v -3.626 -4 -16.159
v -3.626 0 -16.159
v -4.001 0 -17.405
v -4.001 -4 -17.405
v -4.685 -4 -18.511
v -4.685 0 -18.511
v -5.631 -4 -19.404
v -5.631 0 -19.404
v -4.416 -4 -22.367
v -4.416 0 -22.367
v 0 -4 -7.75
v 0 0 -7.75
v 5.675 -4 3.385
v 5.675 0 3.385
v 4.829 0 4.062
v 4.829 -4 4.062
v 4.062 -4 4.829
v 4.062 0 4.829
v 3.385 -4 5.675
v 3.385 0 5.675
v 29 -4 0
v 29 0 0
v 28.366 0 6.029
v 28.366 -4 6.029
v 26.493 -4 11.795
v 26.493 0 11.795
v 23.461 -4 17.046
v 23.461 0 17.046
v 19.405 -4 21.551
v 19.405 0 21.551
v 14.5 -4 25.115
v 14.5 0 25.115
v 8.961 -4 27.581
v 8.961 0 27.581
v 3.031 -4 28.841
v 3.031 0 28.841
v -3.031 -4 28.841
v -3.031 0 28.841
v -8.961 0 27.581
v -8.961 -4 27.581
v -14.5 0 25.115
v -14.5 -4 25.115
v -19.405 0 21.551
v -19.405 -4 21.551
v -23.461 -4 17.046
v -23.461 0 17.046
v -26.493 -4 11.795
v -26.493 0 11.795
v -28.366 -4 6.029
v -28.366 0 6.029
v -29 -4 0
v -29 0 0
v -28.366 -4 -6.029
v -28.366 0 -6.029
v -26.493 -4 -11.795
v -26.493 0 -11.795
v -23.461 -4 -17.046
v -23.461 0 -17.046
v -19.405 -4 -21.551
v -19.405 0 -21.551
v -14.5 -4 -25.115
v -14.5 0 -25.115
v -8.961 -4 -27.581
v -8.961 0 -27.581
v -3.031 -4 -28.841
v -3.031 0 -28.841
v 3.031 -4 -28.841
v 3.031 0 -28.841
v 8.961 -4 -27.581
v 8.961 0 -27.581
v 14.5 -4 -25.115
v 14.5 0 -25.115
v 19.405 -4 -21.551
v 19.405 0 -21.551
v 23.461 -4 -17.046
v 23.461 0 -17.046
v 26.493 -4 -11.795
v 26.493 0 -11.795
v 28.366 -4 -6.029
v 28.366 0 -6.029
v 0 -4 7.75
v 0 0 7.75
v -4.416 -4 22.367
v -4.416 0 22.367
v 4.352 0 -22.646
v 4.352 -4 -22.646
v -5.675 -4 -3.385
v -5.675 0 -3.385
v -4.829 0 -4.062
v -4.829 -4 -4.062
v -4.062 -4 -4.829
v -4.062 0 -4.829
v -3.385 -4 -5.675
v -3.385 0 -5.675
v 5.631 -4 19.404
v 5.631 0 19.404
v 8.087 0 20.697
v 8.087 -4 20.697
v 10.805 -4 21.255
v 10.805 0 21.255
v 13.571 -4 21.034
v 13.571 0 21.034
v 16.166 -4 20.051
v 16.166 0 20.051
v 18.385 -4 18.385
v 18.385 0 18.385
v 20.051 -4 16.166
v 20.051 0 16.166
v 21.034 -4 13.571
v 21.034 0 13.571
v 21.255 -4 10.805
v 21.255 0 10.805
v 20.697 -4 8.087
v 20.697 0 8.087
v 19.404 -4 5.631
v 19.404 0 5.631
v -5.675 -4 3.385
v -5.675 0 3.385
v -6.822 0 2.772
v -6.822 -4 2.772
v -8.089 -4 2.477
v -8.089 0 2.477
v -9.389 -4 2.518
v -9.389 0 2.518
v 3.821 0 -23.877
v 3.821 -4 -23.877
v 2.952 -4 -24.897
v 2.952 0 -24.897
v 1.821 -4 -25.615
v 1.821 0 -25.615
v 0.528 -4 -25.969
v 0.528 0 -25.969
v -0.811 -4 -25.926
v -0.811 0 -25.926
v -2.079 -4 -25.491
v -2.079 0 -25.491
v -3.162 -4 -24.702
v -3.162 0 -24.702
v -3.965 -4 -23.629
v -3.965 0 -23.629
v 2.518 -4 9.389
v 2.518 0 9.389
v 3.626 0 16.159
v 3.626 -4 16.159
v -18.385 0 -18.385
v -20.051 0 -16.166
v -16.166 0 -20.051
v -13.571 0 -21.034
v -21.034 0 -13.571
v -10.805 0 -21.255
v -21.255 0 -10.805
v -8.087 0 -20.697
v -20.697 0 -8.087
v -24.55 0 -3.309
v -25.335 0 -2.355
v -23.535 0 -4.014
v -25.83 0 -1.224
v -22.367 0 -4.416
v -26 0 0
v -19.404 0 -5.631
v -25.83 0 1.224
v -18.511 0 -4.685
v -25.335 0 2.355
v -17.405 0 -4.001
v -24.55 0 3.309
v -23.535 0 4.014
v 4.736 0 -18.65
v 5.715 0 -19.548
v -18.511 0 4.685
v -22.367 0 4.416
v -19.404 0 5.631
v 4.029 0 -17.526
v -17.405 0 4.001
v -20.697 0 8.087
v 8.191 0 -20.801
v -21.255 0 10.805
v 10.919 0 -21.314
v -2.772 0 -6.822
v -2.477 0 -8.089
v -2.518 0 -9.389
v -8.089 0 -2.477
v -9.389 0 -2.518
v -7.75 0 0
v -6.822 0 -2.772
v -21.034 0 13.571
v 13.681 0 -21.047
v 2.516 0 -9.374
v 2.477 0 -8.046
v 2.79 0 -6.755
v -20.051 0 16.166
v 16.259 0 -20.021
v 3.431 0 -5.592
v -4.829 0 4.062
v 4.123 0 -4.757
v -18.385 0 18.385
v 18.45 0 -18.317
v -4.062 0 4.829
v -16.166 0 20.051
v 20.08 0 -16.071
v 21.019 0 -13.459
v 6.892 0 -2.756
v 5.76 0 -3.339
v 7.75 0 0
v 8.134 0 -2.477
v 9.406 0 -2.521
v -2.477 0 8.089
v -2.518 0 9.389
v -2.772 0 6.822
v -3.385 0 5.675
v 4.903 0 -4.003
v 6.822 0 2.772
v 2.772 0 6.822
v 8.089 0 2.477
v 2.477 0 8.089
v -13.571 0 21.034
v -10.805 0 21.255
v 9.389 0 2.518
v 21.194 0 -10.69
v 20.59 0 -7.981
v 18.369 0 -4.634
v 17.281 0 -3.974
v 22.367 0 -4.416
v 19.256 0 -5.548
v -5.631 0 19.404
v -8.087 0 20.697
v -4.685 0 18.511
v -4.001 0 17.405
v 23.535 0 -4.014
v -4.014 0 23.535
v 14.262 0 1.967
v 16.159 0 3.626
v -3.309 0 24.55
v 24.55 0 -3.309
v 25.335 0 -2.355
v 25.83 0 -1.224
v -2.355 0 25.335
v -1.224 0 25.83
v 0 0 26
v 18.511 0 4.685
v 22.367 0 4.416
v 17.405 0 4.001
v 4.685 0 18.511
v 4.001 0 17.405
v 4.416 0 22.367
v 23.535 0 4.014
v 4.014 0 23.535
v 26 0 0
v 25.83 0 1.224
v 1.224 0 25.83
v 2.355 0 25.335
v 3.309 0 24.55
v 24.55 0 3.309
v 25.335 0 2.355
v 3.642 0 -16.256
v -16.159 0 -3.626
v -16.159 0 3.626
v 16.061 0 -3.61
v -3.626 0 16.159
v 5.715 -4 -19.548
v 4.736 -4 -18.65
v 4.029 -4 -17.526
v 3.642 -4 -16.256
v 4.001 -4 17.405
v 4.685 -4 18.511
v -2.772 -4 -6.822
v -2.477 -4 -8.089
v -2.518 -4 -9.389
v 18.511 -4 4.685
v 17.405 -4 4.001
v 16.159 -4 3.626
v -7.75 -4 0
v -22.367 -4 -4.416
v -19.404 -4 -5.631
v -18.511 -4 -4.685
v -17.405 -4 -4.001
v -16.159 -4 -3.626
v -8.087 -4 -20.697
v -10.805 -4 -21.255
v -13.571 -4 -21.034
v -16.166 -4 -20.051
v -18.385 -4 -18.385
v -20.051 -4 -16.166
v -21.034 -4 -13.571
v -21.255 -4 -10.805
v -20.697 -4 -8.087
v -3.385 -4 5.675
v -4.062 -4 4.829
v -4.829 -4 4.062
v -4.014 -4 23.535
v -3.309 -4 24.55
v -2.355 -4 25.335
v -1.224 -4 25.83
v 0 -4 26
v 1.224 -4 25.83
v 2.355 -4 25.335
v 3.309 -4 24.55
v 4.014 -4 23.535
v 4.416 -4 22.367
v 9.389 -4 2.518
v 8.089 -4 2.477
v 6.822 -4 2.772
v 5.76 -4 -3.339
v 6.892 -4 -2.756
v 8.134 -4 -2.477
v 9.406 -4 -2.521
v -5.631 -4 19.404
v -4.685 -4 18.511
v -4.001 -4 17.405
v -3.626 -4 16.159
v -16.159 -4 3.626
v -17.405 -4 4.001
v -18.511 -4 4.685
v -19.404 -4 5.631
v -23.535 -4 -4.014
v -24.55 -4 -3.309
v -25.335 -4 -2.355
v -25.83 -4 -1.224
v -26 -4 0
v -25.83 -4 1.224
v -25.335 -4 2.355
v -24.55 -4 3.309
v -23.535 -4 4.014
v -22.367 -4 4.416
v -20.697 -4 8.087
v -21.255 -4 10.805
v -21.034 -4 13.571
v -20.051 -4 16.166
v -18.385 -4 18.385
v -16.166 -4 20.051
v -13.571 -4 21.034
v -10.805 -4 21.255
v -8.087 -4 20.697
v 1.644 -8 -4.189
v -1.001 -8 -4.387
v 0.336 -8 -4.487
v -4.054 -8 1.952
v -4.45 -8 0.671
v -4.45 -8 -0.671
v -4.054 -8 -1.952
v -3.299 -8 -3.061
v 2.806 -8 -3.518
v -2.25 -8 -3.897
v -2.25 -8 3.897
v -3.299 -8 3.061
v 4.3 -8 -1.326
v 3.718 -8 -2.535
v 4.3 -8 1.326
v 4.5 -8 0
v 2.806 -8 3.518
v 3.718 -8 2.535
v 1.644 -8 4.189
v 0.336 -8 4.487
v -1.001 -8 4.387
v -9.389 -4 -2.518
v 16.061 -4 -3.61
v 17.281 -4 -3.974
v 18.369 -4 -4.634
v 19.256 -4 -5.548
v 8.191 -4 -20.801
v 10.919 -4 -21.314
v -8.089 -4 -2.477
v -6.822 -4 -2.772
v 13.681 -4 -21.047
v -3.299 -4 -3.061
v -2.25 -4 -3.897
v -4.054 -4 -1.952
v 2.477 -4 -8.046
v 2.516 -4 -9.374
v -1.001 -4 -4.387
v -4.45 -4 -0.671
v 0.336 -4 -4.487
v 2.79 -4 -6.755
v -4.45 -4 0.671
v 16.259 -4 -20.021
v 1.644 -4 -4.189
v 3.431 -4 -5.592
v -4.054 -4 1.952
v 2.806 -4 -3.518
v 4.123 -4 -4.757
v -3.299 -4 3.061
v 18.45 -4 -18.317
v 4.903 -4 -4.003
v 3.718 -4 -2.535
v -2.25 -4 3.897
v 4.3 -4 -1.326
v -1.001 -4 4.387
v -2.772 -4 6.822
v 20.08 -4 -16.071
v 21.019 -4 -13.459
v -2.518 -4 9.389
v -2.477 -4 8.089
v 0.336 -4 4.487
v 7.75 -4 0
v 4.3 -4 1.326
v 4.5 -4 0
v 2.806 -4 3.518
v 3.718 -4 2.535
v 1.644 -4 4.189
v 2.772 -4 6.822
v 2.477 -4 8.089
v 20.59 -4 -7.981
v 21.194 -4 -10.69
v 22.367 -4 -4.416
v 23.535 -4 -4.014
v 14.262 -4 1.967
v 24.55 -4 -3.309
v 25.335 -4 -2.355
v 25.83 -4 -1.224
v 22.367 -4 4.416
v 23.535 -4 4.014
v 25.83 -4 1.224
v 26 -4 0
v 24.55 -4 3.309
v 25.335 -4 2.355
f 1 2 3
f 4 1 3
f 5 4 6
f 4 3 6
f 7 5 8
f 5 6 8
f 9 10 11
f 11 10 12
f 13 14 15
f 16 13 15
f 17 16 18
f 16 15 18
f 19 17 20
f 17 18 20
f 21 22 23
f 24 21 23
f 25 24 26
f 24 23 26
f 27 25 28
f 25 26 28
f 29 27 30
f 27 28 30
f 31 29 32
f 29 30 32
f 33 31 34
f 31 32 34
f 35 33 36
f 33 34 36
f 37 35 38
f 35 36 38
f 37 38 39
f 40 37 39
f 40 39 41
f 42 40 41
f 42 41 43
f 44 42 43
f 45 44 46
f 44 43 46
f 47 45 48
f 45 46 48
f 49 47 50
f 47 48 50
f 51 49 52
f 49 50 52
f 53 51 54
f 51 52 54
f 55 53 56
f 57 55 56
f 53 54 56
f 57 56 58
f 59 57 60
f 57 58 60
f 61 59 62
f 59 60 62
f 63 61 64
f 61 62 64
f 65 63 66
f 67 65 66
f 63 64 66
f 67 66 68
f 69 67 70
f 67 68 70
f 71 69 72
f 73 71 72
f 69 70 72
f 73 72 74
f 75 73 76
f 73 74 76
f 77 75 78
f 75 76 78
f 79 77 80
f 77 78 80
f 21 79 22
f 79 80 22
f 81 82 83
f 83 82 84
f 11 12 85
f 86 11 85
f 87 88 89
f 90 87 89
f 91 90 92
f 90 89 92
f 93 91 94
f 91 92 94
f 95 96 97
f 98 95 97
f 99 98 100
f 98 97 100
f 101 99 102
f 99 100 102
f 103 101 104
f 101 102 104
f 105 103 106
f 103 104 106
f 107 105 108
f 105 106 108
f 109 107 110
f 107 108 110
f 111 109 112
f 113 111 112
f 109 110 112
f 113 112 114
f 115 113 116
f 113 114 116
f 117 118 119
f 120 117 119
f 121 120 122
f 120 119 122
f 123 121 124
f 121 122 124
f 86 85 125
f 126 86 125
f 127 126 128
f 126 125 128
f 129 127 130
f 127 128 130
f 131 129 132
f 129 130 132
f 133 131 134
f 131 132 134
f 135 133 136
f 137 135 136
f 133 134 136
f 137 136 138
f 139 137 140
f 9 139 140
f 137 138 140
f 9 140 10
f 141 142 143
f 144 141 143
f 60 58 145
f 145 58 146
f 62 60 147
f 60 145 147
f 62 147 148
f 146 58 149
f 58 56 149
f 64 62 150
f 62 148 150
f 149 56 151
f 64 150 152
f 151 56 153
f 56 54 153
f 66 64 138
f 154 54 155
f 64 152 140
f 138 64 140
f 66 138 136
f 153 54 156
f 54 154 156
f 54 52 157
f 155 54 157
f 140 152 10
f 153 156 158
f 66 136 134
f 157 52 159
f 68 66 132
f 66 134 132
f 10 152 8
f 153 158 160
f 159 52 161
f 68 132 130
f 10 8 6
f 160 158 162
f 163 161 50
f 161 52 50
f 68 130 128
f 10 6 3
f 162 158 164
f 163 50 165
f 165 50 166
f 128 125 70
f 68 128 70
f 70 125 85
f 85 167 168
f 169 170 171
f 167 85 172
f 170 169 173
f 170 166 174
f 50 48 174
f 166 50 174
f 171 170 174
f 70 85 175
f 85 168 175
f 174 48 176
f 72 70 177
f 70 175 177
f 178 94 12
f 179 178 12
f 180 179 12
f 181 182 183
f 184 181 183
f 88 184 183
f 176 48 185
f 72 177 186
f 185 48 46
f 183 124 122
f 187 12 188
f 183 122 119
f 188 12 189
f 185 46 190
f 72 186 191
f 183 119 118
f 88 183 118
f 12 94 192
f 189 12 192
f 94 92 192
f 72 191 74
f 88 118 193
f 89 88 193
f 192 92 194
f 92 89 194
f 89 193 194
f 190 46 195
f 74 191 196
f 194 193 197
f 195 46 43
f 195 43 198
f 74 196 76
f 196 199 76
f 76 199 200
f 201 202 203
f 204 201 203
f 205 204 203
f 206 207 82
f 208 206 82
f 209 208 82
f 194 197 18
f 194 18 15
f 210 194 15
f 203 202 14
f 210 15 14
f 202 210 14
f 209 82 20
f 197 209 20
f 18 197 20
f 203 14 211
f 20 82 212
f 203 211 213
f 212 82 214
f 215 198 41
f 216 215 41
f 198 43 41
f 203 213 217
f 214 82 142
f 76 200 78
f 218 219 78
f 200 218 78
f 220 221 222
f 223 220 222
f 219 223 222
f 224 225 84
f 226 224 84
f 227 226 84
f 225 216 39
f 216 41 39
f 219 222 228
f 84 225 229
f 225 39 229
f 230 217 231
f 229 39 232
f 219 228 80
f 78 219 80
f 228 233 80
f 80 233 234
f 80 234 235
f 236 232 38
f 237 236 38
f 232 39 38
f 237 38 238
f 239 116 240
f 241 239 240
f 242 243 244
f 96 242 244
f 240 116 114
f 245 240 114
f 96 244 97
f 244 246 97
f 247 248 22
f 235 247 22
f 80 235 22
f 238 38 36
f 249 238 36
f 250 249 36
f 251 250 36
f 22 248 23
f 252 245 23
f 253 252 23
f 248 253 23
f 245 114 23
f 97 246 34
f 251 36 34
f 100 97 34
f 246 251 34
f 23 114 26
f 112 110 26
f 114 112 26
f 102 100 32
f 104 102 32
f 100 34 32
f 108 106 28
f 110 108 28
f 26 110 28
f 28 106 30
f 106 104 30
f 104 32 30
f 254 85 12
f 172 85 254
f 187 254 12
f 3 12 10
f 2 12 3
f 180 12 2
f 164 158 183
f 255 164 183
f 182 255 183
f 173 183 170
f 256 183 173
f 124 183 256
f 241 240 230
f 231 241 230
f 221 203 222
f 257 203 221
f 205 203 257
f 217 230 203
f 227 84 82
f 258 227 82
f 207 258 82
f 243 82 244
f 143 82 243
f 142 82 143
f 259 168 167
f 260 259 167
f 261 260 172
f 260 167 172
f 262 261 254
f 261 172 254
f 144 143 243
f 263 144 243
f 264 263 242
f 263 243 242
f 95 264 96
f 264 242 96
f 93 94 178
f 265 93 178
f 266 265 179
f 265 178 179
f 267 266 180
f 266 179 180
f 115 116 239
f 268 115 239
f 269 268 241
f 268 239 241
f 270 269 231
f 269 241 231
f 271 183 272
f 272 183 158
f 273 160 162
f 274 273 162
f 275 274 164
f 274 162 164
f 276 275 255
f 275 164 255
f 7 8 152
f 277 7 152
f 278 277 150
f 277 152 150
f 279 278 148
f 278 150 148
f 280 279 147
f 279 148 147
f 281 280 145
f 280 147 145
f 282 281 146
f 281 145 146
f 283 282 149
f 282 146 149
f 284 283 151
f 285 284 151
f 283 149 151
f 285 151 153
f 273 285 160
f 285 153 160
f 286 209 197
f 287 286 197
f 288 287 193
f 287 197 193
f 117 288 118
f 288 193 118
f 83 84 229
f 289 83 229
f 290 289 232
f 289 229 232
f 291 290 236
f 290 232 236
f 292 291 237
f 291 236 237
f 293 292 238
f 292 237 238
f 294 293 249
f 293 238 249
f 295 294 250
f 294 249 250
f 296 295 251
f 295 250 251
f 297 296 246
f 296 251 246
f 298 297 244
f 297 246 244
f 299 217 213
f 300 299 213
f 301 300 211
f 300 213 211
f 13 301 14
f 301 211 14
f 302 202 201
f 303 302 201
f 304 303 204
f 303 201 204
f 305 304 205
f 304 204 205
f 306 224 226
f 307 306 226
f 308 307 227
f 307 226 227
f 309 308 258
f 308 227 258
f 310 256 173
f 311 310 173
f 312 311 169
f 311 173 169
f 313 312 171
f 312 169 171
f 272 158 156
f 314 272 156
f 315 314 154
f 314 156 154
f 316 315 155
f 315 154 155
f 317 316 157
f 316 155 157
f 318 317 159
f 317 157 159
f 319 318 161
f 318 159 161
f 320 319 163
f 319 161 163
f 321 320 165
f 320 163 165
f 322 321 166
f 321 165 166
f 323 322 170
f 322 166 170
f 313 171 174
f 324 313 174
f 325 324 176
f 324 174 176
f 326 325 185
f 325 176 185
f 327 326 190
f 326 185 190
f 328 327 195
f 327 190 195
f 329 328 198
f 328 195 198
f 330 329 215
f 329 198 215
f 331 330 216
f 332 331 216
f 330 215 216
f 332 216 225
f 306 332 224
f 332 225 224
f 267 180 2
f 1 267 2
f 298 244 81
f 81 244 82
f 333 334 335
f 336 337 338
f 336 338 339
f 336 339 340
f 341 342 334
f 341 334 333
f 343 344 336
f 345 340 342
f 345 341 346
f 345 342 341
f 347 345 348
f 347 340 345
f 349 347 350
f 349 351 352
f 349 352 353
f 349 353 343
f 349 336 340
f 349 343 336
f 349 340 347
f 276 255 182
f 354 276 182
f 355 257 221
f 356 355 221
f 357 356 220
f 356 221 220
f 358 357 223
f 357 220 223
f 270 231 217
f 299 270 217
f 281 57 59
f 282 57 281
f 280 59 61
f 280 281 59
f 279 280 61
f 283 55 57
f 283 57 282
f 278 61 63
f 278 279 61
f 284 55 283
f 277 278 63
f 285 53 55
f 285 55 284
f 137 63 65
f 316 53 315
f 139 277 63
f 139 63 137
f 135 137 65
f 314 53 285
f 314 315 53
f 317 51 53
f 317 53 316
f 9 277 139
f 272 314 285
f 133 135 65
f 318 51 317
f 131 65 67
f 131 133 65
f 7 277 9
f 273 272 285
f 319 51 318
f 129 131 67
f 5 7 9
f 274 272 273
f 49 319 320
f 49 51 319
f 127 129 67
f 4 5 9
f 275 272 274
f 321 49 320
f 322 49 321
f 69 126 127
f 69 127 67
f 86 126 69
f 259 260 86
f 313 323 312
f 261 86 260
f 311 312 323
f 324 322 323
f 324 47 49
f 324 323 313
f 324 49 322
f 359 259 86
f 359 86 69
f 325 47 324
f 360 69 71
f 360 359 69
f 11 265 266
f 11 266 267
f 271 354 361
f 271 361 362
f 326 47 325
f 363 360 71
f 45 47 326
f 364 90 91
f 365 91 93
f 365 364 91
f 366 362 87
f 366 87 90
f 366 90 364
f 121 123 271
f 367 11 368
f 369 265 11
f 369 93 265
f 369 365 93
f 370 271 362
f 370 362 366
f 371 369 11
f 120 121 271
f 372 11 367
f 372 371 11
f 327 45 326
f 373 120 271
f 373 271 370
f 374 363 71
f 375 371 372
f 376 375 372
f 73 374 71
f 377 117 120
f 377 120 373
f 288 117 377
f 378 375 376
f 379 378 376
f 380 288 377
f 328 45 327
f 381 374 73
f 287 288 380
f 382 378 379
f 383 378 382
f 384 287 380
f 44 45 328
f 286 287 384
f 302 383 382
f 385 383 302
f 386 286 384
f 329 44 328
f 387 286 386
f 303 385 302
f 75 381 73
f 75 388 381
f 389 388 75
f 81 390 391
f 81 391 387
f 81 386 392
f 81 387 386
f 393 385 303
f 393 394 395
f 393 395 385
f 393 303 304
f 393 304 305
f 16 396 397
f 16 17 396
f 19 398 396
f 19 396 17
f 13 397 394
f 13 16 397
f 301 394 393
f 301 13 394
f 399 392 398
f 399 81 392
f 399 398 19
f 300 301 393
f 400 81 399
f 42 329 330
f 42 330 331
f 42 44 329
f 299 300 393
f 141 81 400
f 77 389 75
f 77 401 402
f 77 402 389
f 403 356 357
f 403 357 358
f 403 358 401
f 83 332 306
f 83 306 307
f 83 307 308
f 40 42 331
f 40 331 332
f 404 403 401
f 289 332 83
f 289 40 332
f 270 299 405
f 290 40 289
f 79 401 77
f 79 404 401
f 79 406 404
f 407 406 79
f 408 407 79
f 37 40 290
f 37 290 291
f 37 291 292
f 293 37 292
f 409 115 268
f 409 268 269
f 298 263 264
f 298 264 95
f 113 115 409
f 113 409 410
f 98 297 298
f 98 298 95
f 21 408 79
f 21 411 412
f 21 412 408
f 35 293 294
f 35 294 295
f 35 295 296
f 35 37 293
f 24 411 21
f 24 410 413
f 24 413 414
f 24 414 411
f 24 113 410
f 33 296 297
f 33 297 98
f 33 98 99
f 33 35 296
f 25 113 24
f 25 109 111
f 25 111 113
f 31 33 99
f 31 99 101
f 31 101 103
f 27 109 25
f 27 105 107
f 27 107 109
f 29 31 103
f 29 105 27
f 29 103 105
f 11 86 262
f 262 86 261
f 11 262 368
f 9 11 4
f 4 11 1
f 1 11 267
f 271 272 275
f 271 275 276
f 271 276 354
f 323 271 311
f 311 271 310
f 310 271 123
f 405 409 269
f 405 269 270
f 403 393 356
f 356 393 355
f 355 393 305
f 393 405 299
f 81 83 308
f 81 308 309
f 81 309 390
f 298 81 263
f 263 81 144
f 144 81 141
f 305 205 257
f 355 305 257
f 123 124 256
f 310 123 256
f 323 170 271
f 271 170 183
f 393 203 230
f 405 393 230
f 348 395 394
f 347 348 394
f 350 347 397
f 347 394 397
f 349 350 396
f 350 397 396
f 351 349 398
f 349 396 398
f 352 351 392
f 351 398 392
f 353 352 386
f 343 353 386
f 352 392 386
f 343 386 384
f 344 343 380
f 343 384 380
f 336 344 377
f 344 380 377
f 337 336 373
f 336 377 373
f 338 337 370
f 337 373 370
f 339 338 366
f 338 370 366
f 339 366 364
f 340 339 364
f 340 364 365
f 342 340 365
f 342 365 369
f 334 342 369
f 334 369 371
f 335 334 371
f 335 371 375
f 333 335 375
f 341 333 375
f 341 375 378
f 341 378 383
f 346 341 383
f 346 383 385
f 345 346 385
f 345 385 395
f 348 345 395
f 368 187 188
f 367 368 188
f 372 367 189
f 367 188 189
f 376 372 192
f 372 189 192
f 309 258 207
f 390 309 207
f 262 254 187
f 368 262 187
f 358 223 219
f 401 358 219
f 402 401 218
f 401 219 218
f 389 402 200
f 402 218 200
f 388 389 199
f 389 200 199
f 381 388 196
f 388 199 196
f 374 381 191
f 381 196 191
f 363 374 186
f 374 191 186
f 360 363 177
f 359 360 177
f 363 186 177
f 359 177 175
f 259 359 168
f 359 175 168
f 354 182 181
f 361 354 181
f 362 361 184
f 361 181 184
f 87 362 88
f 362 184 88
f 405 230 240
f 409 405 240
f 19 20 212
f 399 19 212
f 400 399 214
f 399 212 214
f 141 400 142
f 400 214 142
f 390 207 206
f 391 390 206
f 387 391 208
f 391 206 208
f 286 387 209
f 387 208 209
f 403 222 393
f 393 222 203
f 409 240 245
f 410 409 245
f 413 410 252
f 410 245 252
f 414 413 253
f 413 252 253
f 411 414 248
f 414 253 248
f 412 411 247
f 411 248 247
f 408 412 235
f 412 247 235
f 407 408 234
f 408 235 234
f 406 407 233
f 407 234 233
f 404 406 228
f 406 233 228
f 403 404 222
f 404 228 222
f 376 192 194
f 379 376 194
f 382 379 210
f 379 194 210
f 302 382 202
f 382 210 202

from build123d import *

# Parameters (mm, degrees)
F0_R     = 4.5
F1_DEPTH = 8
F0_R_2   = 29
F0_R_3   = 27
F2_DEPTH = 4


with BuildPart() as f1:
    # F0 (on Front) → F1 (new body)
    with BuildSketch(Plane.XZ):
        Circle(F0_R)
    extrude(amount=F1_DEPTH)

    # F0 (on Front) → F2 (join)
    with BuildSketch(Plane.XZ):
        Circle(F0_R_2)
        Circle(F0_R_3, mode=Mode.SUBTRACT)
        Circle(F0_R_3)
        with BuildLine():
            ThreePointArc((4.3516162867, -22.646052221), (-0.1431680004, -25.9977219705), (-4.4156935051, -22.3669780097))
            Line((-4.4156935051, -22.3669780097), (0, -7.75))
            Line((0, -7.75), (4.3516162867, -22.646052221))
        make_face(mode=Mode.SUBTRACT)
        with BuildLine():
            ThreePointArc((-19.4040272759, -5.6313106345), (-17.9803864059, -4.3071155471), (-16.1592835692, -3.626064584))
            Line((-16.1592835692, -3.626064584), (-9.3891987076, -2.5182325158))
            ThreePointArc((-9.3891987076, -2.5182325158), (-7.4460025695, -2.583307283), (-5.6745435039, -3.3846678354))
            ThreePointArc((-5.6745435039, -3.3846678354), (-4.4349924254, -4.4349924254), (-3.3846678354, -5.6745435039))
            ThreePointArc((-3.3846678354, -5.6745435039), (-2.583307283, -7.4460025695), (-2.5182325158, -9.3891987076))
            Line((-2.5182325158, -9.3891987076), (-3.626064584, -16.1592835692))
            ThreePointArc((-3.626064584, -16.1592835692), (-4.3071155471, -17.9803864059), (-5.6313106345, -19.4040272759))
            ThreePointArc((-5.6313106345, -19.4040272759), (-18.3847763109, -18.3847763109), (-19.4040272759, -5.6313106345))
        make_face(mode=Mode.SUBTRACT)
        with BuildLine():
            Line((3.6418333236, -16.2556480886), (2.5157025337, -9.3737377061))
            ThreePointArc((2.5157025337, -9.3737377061), (2.5903516211, -7.3902488103), (3.4308544392, -5.5920953967))
            ThreePointArc((3.4308544392, -5.5920953967), (4.5023744658, -4.3693333532), (5.760194673, -3.3391923392))
            ThreePointArc((5.760194673, -3.3391923392), (7.5038582162, -2.5767129031), (9.4061289224, -2.5210029146))
            Line((9.4061289224, -2.5210029146), (16.060956923, -3.6099747692))
            ThreePointArc((16.060956923, -3.6099747692), (17.8462537904, -4.2691049062), (19.2559417587, -5.5475873168))
            ThreePointArc((19.2559417587, -5.5475873168), (18.450217913, -18.3171768004), (5.7146063745, -19.5483572234))
            ThreePointArc((5.7146063745, -19.5483572234), (4.344802068, -18.1118904301), (3.6418333236, -16.2556480886))
        make_face(mode=Mode.SUBTRACT)
        with BuildLine():
            ThreePointArc((-22.3669780097, -4.4156935051), (-26, 0), (-22.3669780097, 4.4156935051))
            Line((-22.3669780097, 4.4156935051), (-7.75, 0))
            Line((-7.75, 0), (-22.3669780097, -4.4156935051))
        make_face(mode=Mode.SUBTRACT)
        with BuildLine():
            Line((-9.3891987076, 2.5182325158), (-16.1592835692, 3.626064584))
            ThreePointArc((-16.1592835692, 3.626064584), (-17.9803864059, 4.3071155471), (-19.4040272759, 5.6313106345))
            ThreePointArc((-19.4040272759, 5.6313106345), (-18.3847763109, 18.3847763109), (-5.6313106345, 19.4040272759))
            ThreePointArc((-5.6313106345, 19.4040272759), (-4.3071155471, 17.9803864059), (-3.626064584, 16.1592835692))
            Line((-3.626064584, 16.1592835692), (-2.5182325158, 9.3891987076))
            ThreePointArc((-2.5182325158, 9.3891987076), (-2.583307283, 7.4460025695), (-3.3846678354, 5.6745435039))
            ThreePointArc((-3.3846678354, 5.6745435039), (-4.4349924254, 4.4349924254), (-5.6745435039, 3.3846678354))
            ThreePointArc((-5.6745435039, 3.3846678354), (-7.4460025695, 2.583307283), (-9.3891987076, 2.5182325158))
        make_face(mode=Mode.SUBTRACT)
        Circle(F0_R, mode=Mode.SUBTRACT)
        with BuildLine():
            Line((16.1592835692, 3.626064584), (9.3891987076, 2.5182325158))
            ThreePointArc((9.3891987076, 2.5182325158), (7.4460025695, 2.583307283), (5.6745435039, 3.3846678354))
            ThreePointArc((5.6745435039, 3.3846678354), (4.4349924254, 4.4349924254), (3.3846678354, 5.6745435039))
            ThreePointArc((3.3846678354, 5.6745435039), (2.583307283, 7.4460025695), (2.5182325158, 9.3891987076))
            Line((2.5182325158, 9.3891987076), (3.626064584, 16.1592835692))
            ThreePointArc((3.626064584, 16.1592835692), (4.3071155471, 17.9803864059), (5.6313106345, 19.4040272759))
            ThreePointArc((5.6313106345, 19.4040272759), (18.3847763109, 18.3847763109), (19.4040272759, 5.6313106345))
            ThreePointArc((19.4040272759, 5.6313106345), (17.9803864059, 4.3071155471), (16.1592835692, 3.626064584))
        make_face(mode=Mode.SUBTRACT)
        with BuildLine():
            ThreePointArc((22.3669780097, 4.4156935051), (26, 0), (22.3669780097, -4.4156935051))
            Line((22.3669780097, -4.4156935051), (7.75, 0))
            Line((7.75, 0), (14.262410288, 1.9673565762))
            Line((14.262410288, 1.9673565762), (22.3669780097, 4.4156935051))
        make_face(mode=Mode.SUBTRACT)
        with BuildLine():
            ThreePointArc((-4.4156935051, 22.3669780097), (0, 26), (4.4156935051, 22.3669780097))
            Line((4.4156935051, 22.3669780097), (0, 7.75))
            Line((0, 7.75), (-4.4156935051, 22.3669780097))
        make_face(mode=Mode.SUBTRACT)
    extrude(amount=F2_DEPTH)


solid = f1.part
